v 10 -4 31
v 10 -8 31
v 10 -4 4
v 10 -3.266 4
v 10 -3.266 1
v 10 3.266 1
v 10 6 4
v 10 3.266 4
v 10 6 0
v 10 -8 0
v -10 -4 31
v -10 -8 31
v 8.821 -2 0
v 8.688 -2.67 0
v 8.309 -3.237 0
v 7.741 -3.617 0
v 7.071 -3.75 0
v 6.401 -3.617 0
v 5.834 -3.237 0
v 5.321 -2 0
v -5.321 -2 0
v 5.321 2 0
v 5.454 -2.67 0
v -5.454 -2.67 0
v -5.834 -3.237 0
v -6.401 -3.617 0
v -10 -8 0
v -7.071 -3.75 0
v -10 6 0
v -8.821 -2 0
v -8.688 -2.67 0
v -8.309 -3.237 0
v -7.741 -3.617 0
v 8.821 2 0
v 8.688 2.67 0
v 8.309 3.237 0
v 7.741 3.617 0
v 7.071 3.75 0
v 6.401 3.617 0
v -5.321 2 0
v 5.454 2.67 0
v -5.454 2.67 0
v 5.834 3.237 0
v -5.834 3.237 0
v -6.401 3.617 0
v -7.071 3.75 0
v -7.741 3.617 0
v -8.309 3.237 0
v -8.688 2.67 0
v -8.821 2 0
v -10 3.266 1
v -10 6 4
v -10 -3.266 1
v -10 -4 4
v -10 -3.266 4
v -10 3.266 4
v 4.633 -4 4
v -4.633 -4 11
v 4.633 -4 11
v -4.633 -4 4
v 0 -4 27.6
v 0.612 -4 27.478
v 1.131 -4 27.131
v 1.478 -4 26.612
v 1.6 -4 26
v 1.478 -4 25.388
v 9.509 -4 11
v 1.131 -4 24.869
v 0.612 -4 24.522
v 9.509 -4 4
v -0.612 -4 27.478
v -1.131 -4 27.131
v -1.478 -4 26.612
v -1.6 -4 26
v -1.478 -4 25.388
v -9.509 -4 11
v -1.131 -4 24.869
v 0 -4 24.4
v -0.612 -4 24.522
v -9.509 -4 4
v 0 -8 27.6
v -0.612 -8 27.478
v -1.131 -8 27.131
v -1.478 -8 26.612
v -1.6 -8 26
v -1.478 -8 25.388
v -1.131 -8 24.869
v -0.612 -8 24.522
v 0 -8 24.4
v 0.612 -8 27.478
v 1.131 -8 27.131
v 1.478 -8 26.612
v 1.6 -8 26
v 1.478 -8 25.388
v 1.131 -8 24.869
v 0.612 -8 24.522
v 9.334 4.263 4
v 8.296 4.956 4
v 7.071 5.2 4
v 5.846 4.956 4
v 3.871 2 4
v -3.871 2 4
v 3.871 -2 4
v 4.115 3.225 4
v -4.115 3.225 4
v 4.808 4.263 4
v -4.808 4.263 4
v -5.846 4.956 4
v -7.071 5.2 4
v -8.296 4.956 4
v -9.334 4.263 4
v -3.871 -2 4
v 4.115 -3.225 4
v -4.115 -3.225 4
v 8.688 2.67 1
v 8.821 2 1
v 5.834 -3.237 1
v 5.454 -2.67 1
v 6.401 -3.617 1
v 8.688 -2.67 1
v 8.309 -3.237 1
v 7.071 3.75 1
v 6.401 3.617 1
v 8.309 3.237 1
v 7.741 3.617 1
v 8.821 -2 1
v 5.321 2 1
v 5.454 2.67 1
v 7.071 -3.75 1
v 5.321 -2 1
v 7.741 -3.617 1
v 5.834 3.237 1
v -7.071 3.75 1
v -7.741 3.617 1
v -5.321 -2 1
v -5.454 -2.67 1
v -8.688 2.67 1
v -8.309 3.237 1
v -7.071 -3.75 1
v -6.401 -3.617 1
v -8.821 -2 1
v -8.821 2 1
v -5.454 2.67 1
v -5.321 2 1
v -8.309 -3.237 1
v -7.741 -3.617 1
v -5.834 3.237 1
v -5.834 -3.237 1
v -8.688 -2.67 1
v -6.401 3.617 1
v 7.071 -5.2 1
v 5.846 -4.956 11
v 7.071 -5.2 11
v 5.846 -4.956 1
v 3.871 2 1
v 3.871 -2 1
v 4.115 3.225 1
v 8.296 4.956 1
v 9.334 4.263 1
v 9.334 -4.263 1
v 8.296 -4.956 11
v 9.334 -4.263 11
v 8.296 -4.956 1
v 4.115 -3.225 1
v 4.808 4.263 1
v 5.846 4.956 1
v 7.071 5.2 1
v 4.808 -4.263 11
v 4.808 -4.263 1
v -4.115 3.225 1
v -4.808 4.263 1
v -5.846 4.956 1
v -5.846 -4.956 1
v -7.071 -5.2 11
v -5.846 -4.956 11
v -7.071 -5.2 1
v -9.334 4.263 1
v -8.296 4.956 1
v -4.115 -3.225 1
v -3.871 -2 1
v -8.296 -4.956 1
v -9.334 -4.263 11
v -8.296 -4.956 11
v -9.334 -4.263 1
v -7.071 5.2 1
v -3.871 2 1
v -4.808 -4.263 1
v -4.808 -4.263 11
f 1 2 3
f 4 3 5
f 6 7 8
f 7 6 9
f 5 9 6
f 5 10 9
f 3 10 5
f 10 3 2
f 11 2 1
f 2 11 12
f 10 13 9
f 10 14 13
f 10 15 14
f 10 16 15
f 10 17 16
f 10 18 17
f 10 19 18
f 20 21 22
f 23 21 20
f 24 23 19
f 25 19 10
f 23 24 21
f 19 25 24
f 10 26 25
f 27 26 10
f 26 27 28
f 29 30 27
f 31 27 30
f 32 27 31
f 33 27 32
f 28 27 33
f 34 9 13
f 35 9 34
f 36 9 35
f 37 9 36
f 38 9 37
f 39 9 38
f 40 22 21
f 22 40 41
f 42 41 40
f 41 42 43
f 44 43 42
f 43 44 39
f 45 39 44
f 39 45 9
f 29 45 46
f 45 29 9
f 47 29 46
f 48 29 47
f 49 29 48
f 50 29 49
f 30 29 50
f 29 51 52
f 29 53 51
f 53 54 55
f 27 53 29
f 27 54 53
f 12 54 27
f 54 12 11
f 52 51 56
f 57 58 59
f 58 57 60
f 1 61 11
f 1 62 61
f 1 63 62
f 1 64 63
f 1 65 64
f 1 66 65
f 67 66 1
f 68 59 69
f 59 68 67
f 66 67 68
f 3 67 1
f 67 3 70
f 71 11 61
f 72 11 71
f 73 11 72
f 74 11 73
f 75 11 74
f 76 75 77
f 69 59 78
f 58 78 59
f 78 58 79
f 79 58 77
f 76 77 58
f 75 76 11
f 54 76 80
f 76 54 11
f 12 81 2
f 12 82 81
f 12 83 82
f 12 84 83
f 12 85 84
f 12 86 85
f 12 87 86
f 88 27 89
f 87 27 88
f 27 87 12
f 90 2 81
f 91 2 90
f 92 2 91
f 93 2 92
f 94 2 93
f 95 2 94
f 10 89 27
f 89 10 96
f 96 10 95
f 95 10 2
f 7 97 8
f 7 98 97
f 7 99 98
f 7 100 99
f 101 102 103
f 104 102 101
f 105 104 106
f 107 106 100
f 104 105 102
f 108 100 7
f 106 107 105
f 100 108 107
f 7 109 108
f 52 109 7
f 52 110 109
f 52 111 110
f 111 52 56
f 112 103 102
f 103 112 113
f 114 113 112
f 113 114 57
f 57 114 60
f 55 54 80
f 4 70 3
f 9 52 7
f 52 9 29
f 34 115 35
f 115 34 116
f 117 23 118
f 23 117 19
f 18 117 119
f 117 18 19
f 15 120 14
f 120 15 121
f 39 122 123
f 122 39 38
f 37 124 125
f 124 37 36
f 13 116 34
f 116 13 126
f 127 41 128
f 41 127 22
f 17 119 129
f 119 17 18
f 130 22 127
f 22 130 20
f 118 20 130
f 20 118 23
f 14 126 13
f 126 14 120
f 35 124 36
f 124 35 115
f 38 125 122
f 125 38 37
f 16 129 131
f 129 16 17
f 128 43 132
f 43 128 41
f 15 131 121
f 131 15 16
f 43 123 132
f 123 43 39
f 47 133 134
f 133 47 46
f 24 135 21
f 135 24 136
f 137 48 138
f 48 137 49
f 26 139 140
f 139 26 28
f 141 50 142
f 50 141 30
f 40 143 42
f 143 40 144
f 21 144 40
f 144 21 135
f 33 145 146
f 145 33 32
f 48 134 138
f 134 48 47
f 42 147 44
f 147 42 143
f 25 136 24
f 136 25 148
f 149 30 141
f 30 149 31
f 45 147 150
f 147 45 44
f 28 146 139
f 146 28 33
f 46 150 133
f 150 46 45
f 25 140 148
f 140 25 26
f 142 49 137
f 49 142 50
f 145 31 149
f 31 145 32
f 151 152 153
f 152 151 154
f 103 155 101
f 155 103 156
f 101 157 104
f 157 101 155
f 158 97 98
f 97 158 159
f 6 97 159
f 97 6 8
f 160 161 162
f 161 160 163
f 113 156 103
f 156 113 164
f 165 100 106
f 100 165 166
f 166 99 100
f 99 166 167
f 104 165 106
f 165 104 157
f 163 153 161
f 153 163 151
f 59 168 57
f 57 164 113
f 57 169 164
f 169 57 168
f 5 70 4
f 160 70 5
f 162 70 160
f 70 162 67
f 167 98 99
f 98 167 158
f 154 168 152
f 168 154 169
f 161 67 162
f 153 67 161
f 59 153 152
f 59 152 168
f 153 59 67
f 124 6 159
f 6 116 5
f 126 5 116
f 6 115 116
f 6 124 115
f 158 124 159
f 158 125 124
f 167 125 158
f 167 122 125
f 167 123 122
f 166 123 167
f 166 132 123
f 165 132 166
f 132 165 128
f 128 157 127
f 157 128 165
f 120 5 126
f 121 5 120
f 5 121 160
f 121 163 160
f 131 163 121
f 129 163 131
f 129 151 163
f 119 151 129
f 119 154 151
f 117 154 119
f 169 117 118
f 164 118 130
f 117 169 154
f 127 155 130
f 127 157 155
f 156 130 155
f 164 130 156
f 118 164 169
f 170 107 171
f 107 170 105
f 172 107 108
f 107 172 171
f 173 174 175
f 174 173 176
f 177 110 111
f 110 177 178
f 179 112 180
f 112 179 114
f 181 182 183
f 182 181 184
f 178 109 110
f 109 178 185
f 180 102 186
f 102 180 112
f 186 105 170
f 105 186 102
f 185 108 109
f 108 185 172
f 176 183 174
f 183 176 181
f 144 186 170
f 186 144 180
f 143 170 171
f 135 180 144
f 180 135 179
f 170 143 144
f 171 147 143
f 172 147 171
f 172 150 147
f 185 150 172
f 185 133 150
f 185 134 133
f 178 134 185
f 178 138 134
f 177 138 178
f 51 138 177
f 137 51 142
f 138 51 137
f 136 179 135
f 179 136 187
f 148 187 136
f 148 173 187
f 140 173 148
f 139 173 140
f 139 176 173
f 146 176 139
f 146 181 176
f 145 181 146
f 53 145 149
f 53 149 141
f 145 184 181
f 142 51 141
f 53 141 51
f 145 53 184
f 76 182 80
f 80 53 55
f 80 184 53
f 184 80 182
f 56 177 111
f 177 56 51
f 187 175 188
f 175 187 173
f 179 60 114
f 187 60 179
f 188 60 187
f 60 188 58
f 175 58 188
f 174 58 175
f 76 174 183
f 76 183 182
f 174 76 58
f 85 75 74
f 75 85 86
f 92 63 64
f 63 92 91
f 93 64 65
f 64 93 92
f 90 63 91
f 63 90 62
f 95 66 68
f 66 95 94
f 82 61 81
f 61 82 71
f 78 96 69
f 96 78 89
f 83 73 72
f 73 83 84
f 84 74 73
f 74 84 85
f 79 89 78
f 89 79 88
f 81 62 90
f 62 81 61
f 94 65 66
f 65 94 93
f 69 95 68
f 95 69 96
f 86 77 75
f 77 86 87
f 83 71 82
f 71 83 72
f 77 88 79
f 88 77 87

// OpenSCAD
// file: parameters.scad
/*
  Useful settings/parameters for the OpenFlexure fibre stage
*/
version_numstring = "0.2.0";
stage = [37,20,5]; //dimensions of stage part

// Range of travel is lever length * flex_a
xy_lever = 10;
z_lever = 10;

// Mechanical reduction settings
xy_stage_reduction = 3; //ratio of sample motion to lower shelf motion
xy_reduction = 5; //mechanical reduction from screw to sample
z_reduction = 5; //mechanical reduction for Z

// Motor lugs
motor_lugs = true;

// Flexure dimensions - good for PLA and ~0.5mm nozzle
zflex = [6, 1.5, 0.75]; //dimensions of flexure
xflex = [5,5.5,5]; //default bounding box of x flexure
xflex_t = 1; //thickness of bendy bit in x
flex_a = 0.1; //angle through which flexures are bent, radians
dz = 0.5; //thickness before a bridge is printable-on

xy_travel = xy_lever * flex_a; //max. travel in X or Y
xy_bottom_travel = xy_travel * xy_stage_reduction; //travel of bottom of XY stage
xy_actuator_pivot_w = 25; //width of the hinge for the actuating lever

pushstick = [5,38,5]; //cross-section of XY "push stick"
pw = pushstick[0]; //because this is used in a lot of places...

wall_t = 1.6;
d=0.05;

// Height of the bridging "shelves" in the XY axis "table" structure
shelf_z1 = xy_lever * xy_stage_reduction;
shelf_z2 = shelf_z1 + xy_lever;

// Z axis geometry
z_travel = z_lever * flex_a; //max. travel in Z
z_stage_base_y = -stage[1]/2-xy_bottom_travel; //position of the flexure edge of the Z stage
z_stage_base_w = stage[0] + 2*zflex[1] - 2*xy_bottom_travel - 2; //width of the flexure edge of the Z stage
z_anchor_bottom_y = z_stage_base_y - z_lever - zflex[1]; // lower Z stage end of the fixed base
z_actuator_pivot_y = stage[1]/2 + zflex[1] + zflex[0] + xy_bottom_travel + wall_t;
z_actuator_pivot_w = 20; //width of the hinge for the Z actuator lever
z_pushstick_z = shelf_z1 - pw - 2.5; // height of the Z pushstick

// Mounting stuff
mounting_bolts = [[-1,0,0],[0,-1,0],[1,0,0]]*25*1*1.41; //bolt to the bench
platform_z = shelf_z2 + stage[2] + 7;
fixed_platform_standoff = 10;
fixed_platform = [50,40,4];
platform_gap = xy_travel + 1;
casing_top = shelf_z2 + stage[2] - z_travel; //top of the wall
// main file
/*

An adapter to fit the OpenFlexure Microscope optics module on the
fibre alignment stage

(c) 2016 Richard Bowman - released under CERN Open Hardware License

*/

use <utilities.scad>;
use <dovetail.scad>;
include <parameters.scad>;

beam_height = platform_z + 3 + 10 + 6;

module optics_to_platform(){
    h=25;
    keel = [3-0.3,1,h];
    translate([0,10+3,0]) mirror([0,1,0]) dovetail_clip([14,10,h],solid_bottom=0.5,slope_front=3);
    translate([-16,0,0]) cube([32,3+d,h]);
    translate([-keel[0]/2,-keel[1],0]) cube(keel+[0,d,0]);
}

module slide_holder(){
    h = beam_height - shelf_z2 - stage[2] + 5;
    w = 20;
    so = fixed_platform_standoff;
    difference(){
        union(){
            translate([-w/2,-so+2,0]) cube([w,4,h]);
            translate([-w/2,-so+2,0]) cube([w,so-2 + 2 + 4,4]);
        }
        reflect([1,0,0]) hull() reflect([0,1,0]) translate([5*sqrt(2),2,1]) cylinder(d=3.5,h=20,$fn=16, center=true);
        reflect([1,0,0]) hull() reflect([0,1,0]) translate([5*sqrt(2),2,1]) cylinder(r=3.2,h=10,$fn=16);
        translate([0,0,beam_height - shelf_z2 - stage[2]]) rotate([90,0,0]) cylinder(d=3.2,h=999,center=true,$fn=16);
    }
}
slide_holder();
